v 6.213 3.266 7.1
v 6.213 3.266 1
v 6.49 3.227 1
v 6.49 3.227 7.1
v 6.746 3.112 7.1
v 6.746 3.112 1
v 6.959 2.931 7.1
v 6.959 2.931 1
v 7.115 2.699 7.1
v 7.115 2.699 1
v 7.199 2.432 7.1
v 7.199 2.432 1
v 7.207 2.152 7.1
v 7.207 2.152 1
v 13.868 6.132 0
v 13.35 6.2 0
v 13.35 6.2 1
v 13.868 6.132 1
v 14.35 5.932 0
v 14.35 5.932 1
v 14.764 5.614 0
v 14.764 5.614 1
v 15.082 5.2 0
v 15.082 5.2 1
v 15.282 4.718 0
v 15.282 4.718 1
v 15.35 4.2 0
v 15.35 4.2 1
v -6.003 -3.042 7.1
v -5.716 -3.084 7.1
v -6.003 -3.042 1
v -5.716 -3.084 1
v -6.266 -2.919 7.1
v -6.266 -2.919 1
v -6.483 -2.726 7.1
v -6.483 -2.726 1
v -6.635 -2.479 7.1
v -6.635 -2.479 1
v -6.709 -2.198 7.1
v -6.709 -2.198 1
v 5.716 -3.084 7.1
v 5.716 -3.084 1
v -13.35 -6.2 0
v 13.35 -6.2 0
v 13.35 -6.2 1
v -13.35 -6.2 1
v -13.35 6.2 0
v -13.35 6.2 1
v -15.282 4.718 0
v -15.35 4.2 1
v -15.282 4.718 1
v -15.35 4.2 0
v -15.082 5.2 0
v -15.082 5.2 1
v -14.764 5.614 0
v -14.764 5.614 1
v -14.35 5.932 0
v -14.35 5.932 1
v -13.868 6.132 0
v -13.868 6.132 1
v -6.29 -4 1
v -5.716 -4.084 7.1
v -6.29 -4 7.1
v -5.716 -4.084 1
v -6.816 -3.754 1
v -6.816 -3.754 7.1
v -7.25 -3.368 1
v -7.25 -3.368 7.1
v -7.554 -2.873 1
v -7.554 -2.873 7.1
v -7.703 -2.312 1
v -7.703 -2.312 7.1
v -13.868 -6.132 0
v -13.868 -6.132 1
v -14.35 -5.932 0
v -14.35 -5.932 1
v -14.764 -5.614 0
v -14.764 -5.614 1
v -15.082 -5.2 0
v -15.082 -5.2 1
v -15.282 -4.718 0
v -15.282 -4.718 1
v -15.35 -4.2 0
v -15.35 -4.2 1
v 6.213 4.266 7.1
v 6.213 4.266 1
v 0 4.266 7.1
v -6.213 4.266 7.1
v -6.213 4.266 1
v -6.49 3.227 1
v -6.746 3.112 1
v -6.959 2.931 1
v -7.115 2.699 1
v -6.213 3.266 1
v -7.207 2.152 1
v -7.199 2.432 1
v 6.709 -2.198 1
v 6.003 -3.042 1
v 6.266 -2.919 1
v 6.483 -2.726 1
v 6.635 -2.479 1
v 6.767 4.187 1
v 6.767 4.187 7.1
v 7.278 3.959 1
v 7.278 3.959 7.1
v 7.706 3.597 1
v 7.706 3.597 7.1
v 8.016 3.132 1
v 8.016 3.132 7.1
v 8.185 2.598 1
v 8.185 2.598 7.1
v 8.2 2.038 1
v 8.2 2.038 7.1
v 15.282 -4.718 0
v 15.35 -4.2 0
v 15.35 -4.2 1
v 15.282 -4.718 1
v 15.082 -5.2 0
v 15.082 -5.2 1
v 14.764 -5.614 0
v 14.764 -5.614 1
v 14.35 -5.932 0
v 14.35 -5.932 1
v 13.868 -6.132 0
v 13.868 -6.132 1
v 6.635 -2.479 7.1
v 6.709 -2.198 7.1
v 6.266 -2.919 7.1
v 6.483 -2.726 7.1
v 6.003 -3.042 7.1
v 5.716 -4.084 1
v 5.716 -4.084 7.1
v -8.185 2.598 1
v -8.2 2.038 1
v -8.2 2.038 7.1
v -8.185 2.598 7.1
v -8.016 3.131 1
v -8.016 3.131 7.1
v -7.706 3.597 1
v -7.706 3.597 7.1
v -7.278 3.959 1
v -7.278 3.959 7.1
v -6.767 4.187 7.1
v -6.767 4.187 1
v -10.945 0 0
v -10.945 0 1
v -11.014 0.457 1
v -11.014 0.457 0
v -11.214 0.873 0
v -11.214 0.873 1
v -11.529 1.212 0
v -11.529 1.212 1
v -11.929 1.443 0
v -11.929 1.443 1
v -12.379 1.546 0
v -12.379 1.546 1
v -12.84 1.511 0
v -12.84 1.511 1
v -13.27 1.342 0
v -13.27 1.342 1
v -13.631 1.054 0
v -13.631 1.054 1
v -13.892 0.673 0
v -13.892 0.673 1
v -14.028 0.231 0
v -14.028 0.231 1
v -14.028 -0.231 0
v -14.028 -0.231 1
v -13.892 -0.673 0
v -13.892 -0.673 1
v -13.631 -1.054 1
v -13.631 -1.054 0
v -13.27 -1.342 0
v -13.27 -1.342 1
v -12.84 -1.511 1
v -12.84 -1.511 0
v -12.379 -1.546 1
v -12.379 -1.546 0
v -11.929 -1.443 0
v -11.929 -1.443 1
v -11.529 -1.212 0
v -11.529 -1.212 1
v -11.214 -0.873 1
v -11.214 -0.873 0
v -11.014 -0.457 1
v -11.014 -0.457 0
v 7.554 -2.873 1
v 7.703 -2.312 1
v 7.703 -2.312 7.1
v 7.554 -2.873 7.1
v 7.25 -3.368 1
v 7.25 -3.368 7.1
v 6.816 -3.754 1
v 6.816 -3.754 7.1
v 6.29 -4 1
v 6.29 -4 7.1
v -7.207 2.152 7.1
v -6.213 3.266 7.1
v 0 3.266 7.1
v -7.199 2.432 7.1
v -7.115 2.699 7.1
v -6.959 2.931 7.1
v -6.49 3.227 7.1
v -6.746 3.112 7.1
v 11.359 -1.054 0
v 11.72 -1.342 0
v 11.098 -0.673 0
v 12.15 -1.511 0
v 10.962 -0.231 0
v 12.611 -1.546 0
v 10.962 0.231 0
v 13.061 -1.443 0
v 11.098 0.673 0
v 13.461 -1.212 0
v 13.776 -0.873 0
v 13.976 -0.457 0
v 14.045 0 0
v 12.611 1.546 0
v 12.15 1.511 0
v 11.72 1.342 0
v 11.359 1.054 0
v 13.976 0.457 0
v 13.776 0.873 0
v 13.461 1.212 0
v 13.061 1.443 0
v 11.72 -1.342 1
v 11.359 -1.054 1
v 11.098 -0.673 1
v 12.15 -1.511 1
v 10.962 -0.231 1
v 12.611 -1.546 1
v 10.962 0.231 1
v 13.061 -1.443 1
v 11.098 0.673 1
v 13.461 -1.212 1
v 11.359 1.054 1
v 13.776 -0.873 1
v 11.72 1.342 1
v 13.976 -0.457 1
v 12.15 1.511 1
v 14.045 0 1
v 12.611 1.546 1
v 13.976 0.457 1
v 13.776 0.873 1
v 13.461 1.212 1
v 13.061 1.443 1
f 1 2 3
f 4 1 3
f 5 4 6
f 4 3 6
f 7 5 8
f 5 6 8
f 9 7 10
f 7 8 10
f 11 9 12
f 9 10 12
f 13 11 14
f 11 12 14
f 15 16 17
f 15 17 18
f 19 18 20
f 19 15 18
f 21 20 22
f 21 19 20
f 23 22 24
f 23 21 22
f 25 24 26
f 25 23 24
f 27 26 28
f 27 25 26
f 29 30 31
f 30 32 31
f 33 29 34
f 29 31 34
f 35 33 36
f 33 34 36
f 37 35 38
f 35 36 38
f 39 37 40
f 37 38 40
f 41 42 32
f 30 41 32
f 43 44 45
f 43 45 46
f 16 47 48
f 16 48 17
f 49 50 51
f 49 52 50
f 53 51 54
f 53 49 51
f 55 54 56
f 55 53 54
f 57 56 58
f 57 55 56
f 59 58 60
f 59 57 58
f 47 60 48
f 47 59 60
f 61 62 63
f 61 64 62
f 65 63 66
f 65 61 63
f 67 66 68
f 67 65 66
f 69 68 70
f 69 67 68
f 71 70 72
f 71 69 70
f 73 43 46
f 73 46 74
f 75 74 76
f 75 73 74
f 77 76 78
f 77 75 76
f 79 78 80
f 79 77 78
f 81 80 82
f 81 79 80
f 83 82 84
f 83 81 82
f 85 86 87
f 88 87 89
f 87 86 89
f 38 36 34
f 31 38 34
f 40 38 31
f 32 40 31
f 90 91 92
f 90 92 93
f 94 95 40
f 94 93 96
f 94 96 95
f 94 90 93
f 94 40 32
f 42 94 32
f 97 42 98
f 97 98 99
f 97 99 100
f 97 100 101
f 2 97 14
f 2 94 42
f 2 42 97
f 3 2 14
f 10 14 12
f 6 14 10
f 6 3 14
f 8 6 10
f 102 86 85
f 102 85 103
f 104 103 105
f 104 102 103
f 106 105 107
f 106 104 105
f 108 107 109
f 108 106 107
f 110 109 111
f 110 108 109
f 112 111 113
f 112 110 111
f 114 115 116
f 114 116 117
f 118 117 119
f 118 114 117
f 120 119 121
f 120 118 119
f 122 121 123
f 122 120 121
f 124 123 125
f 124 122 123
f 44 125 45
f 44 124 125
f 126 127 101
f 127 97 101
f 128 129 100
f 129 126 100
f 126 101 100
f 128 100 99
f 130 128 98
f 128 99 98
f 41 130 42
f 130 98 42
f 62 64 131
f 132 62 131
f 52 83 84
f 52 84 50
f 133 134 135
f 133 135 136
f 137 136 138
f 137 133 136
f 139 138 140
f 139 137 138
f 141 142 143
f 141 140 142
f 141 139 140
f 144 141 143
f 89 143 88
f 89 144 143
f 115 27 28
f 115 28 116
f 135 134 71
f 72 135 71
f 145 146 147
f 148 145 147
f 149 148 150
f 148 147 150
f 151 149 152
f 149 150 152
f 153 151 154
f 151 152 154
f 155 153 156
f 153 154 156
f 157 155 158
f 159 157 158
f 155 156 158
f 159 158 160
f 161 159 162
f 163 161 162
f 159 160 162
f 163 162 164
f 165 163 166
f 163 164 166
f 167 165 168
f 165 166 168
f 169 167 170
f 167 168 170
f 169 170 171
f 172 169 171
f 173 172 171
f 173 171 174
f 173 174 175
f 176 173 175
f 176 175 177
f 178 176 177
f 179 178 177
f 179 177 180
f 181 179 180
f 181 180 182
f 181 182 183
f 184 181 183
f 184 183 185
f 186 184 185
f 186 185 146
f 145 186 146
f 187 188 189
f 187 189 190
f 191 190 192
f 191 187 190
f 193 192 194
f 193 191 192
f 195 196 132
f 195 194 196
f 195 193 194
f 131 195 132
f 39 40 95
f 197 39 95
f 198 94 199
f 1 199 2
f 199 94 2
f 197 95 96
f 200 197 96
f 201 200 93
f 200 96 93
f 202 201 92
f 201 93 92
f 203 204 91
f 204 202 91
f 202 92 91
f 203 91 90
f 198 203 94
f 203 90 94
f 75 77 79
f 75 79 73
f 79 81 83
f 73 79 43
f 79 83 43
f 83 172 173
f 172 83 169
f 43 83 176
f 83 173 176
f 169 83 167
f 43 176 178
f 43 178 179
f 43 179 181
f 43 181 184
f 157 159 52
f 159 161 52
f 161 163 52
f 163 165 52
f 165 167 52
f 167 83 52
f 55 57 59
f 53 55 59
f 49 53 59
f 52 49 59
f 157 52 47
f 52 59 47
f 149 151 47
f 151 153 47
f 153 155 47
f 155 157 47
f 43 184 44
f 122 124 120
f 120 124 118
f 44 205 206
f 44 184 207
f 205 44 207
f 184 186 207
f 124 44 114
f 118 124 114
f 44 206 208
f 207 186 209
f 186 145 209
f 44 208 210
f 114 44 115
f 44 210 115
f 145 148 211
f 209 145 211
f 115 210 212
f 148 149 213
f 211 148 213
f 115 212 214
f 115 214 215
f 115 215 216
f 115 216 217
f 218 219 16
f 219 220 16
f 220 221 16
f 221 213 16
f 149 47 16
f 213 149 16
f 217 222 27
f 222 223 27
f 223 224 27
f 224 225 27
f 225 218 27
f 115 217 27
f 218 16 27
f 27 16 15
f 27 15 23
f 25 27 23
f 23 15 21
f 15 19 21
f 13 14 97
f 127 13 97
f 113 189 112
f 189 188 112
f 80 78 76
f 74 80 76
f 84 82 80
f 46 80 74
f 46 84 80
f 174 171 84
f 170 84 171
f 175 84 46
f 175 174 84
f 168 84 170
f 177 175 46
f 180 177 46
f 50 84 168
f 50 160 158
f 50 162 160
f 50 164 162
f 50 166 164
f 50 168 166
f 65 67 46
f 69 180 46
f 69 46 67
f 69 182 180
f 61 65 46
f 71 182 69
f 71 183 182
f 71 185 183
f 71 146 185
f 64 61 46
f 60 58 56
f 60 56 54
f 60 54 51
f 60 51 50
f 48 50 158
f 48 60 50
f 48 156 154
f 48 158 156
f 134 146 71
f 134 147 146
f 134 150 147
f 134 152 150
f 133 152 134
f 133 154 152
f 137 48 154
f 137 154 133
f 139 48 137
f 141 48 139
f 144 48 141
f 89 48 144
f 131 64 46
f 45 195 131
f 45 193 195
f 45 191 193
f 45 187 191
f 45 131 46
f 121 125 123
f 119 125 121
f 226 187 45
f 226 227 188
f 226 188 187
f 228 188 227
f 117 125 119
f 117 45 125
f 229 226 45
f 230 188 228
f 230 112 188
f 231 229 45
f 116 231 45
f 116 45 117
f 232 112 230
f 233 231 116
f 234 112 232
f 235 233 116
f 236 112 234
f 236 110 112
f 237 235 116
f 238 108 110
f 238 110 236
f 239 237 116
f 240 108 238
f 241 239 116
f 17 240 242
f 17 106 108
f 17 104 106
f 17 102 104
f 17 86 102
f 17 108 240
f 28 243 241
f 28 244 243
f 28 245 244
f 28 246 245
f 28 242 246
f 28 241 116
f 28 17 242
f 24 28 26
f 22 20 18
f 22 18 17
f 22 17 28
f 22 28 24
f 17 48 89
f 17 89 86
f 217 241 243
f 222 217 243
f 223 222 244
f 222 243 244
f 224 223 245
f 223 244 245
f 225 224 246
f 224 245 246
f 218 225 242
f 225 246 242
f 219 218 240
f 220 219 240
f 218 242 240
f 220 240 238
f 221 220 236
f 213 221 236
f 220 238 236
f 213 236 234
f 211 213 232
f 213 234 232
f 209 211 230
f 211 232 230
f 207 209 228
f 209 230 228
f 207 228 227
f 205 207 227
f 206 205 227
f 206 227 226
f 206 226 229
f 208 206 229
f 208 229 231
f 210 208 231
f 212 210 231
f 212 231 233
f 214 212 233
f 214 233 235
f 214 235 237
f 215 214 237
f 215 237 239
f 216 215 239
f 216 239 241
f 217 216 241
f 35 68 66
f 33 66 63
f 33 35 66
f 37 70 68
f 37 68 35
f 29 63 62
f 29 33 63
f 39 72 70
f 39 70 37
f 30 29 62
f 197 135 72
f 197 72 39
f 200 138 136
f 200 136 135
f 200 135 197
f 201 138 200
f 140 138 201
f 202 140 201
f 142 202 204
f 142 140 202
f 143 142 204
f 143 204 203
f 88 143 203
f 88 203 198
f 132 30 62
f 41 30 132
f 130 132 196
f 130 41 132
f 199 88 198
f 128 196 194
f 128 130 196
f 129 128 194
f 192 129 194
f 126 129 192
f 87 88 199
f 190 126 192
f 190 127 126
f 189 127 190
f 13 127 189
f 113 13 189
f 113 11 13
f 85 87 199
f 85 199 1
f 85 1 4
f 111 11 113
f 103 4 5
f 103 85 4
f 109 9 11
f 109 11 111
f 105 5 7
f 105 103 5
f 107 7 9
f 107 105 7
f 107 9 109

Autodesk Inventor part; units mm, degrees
ref_plane "YZ Plane" through (0, 0, 0) normal (1, 0, 0) x (0, 1, 0)
ref_plane "XZ Plane" through (0, 0, 0) normal (0, 1, 0) x (-1, 0, 0)
ref_plane "XY Plane" through (0, 0, 0) normal (0, 0, 1) x (1, 0, 0)
sketch "Sketch1" plane through (0, 0, 0) normal (0, 0, 1) x (1, 0, 0)
  line L0 (-13.35, 6.2) -> (13.35, 6.2)
  line L1 (15.35, 4.2) -> (15.35, -4.2)
  line L2 (13.35, -6.2) -> (-13.35, -6.2)
  line L3 (-15.35, -4.2) -> (-15.35, 4.2)
  line L4 (-15.35, 6.2) -> (15.35, -6.2) construction
  line L5 (15.35, 6.2) -> (-15.35, -6.2) construction
  arc A0 (-13.35, 6.2) -> (-15.35, 4.2) centre (-13.35, 4.2) ccw
  arc A1 (15.35, 4.2) -> (13.35, 6.2) centre (13.35, 4.2) ccw
  arc A2 (13.35, -6.2) -> (15.35, -4.2) centre (13.35, -4.2) ccw
  arc A3 (-15.35, -4.2) -> (-13.35, -6.2) centre (-13.35, -4.2) ccw
  point P0 (0, 0)
  dimension "d0" = 12.4
  dimension "d1" = 30.7
  dimension "d2" = 2
extrude "Extrusion1" add sketch "Sketch1" along normal blind 1
sketch "Sketch2" plane through (0, 0, 1) normal (0, 0, 1) x (1, 0, 0)
  circle A0 centre (-12.495, 0) radius 1.55
  circle A1 centre (12.495, 0) radius 1.55
  line L0 (0, 0) -> (0, 2.0374)
  dimension "d5" = 3.1
  dimension "d6" = 24.99
extrude "Extrusion2" cut sketch "Sketch2" against normal through all
sketch "Sketch3" plane through (0, 0, 1) normal (0, 0, 1) x (1, 0, 0)
  line L0 (6.2132, 4.2657) -> (-6.2132, 4.2657)
  line L1 (-8.2003, 2.0385) -> (-7.7028, -2.3115)
  line L2 (-5.7157, -4.0843) -> (5.7157, -4.0843)
  line L3 (7.7028, -2.3115) -> (8.2003, 2.0385)
  line L4 (0, 0) -> (0, 9.8528)
  arc A0 (-6.2132, 4.2657) -> (-8.2003, 2.0385) centre (-6.2132, 2.2657) ccw
  arc A1 (8.2003, 2.0385) -> (6.2132, 4.2657) centre (6.2132, 2.2657) ccw
  arc A2 (5.7157, -4.0843) -> (7.7028, -2.3115) centre (5.7157, -2.0843) ccw
  arc A3 (-7.7028, -2.3115) -> (-5.7157, -4.0843) centre (-5.7157, -2.0843) ccw
  line L5 (6.2132, 2.2657) -> (-5.7157, -2.0843)
  line L6 (-6.2132, 2.2657) -> (5.7157, -2.0843)
  line L7 (-6.2132, 3.2657) -> (6.2132, 3.2657)
  arc A4 (7.2067, 2.1521) -> (6.2132, 3.2657) centre (6.2132, 2.2657) ccw
  line L8 (7.2067, 2.1521) -> (6.7092, -2.1979)
  arc A5 (5.7157, -3.0843) -> (6.7092, -2.1979) centre (5.7157, -2.0843) ccw
  line L9 (5.7157, -3.0843) -> (-5.7157, -3.0843)
  arc A6 (-6.7092, -2.1979) -> (-5.7157, -3.0843) centre (-5.7157, -2.0843) ccw
  line L10 (-6.7092, -2.1979) -> (-7.2067, 2.1521)
  arc A7 (-6.2132, 3.2657) -> (-7.2067, 2.1521) centre (-6.2132, 2.2657) ccw
  point P0 (8.455, 4.2657)
  point P1 (-8.455, 4.2657)
  point P2 (-7.5, -4.0843)
  point P3 (7.5, -4.0843)
  dimension "d9" = 8.35
  dimension "d10" = 16.91
  dimension "d11" = 15
  dimension "d12" = 2
  dimension "d15" = 1
extrude "Extrusion3" add sketch "Sketch3" along normal blind 6.1
properties part number "Dsub_9pin_female" material "Aluminum 6061"
